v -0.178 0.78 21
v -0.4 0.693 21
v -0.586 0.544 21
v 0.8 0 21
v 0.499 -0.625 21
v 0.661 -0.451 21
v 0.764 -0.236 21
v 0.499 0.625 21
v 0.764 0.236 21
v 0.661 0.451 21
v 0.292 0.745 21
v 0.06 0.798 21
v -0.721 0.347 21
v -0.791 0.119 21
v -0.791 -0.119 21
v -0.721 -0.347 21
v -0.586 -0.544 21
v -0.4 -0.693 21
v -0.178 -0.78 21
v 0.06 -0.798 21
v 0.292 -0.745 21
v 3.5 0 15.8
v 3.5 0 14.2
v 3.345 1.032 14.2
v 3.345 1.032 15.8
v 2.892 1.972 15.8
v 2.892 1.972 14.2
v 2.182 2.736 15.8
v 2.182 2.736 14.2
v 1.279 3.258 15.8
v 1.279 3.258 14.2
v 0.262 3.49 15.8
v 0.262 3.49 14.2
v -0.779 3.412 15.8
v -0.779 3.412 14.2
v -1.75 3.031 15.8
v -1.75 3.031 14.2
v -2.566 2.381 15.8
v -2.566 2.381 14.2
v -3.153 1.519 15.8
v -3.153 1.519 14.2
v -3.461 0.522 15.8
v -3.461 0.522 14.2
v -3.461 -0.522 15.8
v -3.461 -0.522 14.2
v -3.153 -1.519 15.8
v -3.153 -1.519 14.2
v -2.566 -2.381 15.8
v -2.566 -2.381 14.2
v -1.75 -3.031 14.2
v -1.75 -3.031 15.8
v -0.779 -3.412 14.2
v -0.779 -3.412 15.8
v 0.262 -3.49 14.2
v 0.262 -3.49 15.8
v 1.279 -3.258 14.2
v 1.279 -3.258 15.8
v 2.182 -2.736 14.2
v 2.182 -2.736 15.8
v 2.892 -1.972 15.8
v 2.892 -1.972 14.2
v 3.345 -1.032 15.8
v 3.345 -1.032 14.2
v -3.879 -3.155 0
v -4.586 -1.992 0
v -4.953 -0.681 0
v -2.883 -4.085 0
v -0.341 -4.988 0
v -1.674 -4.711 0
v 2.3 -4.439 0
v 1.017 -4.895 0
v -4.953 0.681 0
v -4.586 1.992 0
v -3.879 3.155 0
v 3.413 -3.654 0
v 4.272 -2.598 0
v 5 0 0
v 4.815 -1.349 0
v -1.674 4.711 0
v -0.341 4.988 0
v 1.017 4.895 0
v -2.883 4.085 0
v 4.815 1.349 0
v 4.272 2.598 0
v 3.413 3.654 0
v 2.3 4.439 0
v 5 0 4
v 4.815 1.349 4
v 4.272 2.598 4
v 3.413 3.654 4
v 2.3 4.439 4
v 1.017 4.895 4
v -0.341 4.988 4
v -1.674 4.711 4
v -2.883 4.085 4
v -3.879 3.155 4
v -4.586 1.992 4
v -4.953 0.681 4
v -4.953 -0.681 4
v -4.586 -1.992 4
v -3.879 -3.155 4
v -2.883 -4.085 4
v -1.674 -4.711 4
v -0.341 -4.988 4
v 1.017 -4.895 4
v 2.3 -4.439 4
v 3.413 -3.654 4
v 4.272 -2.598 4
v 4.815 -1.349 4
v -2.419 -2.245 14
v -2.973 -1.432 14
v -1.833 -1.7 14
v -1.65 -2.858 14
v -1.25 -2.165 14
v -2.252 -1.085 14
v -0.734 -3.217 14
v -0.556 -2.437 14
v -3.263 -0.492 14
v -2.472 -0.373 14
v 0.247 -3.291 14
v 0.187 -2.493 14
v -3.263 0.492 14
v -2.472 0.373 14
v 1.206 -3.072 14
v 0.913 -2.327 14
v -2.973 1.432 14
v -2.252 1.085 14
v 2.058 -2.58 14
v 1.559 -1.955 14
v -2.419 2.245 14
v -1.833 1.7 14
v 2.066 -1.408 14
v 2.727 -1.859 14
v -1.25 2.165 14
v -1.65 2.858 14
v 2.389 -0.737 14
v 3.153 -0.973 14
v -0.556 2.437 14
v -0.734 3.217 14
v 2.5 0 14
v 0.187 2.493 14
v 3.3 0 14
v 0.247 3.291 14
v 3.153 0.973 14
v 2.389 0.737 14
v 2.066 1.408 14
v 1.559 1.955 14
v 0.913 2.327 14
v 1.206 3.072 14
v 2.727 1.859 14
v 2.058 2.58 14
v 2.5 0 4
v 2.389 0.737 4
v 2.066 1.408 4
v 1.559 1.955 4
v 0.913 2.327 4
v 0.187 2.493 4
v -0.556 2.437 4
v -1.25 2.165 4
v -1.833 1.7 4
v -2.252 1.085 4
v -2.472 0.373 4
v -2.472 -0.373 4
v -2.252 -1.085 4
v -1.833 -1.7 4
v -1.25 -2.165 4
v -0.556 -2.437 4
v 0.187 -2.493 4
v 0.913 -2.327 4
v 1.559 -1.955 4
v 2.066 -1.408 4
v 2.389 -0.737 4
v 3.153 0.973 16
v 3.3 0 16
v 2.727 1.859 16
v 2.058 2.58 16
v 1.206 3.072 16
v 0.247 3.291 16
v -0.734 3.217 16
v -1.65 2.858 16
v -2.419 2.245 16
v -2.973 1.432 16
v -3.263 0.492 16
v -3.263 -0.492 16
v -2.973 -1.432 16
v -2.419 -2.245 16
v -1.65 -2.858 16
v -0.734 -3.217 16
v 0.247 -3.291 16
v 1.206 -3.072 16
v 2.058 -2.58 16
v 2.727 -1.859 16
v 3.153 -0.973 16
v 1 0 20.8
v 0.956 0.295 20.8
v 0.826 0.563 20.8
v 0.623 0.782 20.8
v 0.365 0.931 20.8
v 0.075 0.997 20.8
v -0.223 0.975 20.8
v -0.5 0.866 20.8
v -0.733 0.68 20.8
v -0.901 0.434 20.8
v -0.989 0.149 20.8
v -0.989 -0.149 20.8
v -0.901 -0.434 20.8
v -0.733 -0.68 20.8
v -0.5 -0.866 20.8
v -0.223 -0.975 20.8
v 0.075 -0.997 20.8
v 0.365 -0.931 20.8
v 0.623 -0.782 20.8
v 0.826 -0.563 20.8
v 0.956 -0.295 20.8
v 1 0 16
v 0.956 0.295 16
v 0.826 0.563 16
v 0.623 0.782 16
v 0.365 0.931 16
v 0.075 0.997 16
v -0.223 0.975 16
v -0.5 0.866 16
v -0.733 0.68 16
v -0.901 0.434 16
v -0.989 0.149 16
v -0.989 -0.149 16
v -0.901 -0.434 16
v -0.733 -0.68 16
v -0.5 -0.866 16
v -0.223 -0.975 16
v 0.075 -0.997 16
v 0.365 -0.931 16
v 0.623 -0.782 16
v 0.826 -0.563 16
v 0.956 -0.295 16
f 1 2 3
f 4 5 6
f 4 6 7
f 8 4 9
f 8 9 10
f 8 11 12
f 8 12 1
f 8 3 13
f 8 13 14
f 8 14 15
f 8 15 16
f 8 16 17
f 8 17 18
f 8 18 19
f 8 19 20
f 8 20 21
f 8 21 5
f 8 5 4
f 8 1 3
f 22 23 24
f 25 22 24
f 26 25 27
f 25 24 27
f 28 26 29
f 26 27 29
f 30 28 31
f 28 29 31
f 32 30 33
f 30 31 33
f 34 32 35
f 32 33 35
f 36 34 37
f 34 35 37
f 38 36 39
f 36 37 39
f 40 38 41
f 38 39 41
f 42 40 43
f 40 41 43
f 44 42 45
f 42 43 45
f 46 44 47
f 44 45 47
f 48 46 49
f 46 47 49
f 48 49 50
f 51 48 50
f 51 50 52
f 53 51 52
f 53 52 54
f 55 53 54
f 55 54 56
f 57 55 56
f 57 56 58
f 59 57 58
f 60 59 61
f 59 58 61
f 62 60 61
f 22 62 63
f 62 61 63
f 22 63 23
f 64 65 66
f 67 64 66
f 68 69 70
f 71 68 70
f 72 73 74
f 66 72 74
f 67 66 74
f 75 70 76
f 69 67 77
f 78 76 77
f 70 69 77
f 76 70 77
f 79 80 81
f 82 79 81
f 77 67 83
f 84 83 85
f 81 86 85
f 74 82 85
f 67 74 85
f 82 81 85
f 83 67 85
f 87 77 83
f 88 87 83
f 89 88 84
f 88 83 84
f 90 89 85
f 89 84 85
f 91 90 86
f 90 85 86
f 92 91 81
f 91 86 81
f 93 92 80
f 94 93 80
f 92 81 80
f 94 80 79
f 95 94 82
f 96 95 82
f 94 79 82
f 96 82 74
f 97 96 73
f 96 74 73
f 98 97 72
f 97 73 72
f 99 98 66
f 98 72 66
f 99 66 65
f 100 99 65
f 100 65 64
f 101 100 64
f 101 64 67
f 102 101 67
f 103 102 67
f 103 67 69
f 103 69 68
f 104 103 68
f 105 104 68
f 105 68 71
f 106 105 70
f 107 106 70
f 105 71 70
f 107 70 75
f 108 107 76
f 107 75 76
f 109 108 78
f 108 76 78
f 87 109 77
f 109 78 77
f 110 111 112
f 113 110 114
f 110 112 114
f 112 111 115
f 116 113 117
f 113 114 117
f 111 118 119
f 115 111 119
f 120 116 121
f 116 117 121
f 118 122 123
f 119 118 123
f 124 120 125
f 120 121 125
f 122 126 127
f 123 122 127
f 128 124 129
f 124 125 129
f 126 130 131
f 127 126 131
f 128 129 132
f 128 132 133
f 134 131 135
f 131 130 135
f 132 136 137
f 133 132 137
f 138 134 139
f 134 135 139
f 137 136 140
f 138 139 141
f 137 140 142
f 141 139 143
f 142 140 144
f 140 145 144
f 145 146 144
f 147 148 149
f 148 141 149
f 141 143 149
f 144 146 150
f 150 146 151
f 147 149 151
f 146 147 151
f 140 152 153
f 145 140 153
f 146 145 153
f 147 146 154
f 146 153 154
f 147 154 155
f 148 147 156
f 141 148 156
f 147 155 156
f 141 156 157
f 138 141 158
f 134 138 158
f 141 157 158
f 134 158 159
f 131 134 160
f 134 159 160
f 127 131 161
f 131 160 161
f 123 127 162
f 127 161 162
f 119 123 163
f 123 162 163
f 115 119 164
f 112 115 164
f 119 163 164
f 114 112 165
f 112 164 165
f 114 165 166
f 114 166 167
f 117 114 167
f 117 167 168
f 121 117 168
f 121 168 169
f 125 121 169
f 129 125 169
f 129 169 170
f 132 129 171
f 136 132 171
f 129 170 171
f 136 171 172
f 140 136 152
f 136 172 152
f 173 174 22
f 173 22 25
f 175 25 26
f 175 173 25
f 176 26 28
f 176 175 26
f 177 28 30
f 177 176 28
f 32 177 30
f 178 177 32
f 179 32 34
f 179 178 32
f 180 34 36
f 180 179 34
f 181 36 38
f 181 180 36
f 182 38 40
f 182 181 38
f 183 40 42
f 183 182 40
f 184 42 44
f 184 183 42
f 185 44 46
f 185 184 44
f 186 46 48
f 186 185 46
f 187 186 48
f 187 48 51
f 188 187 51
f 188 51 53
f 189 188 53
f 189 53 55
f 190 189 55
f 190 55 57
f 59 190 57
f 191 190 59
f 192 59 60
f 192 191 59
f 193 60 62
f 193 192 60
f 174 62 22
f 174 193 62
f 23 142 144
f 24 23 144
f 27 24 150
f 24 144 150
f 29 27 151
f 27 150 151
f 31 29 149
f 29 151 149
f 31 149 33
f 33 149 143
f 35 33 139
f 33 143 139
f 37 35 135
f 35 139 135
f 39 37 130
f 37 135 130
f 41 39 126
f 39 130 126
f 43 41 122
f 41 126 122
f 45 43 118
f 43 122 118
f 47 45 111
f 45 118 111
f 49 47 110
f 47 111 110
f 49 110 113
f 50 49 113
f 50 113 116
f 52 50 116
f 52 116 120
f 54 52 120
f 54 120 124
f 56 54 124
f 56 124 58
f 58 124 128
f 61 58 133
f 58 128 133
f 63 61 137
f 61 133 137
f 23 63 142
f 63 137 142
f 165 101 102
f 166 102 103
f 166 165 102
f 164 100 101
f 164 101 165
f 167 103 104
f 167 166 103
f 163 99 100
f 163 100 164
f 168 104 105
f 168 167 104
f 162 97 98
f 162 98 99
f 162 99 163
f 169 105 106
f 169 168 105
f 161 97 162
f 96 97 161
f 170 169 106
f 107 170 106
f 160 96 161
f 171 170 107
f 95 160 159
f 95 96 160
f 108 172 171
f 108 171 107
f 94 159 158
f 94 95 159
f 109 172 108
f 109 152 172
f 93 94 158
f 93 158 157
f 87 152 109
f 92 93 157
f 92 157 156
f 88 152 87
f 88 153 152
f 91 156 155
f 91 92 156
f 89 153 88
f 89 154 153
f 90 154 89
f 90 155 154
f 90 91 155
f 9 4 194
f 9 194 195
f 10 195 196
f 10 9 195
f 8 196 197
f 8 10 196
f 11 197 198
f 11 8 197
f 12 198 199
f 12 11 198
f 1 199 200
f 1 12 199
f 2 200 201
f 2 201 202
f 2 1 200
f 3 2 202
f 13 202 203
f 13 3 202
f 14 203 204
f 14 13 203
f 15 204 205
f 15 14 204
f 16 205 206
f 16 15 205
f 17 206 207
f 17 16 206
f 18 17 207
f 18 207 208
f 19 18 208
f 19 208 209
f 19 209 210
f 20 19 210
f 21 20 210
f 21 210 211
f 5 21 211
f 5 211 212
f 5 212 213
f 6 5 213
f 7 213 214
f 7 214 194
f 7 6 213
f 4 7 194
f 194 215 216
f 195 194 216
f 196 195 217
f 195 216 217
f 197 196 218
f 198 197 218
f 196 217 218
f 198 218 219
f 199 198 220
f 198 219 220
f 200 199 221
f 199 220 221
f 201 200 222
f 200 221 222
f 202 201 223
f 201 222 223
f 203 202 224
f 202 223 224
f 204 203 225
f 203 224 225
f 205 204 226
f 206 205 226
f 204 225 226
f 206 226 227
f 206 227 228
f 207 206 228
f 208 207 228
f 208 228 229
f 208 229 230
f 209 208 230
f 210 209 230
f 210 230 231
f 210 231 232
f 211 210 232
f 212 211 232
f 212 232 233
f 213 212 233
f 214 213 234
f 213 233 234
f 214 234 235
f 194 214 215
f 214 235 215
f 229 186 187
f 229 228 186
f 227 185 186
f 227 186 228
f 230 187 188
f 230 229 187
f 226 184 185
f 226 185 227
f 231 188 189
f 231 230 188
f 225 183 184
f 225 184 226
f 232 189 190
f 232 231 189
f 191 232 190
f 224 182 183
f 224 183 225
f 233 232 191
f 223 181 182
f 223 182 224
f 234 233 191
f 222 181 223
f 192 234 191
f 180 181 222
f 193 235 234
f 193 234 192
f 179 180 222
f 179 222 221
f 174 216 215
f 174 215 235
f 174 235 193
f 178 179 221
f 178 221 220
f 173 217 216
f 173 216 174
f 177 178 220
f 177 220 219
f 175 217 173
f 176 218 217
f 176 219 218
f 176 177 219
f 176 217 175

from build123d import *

# Parameters (mm, degrees)
F0_R     = 5
F1_DEPTH = 4
F2_R     = 2.5
F3_DEPTH = 10
F4_R     = 3.5
F5_DEPTH = 2
F6_R     = 1
F7_DEPTH = 5
F8_SIZE  = 0.2


with BuildPart() as f1:
    # F0 (on Top) → F1 (new body)
    with BuildSketch(Plane.XY):
        Circle(F0_R)
    extrude(amount=F1_DEPTH)

    # F2 (on face) → F3 (join)
    with BuildSketch(Plane.XY.offset(4)):
        Circle(F2_R)
    extrude(amount=F3_DEPTH)

    # F4 (on face) → F5 (join)
    with BuildSketch(Plane.XY.offset(14)):
        Circle(F4_R)
    extrude(amount=F5_DEPTH)

    # F6 (on face) → F7 (join)
    with BuildSketch(Plane.XY.offset(16)):
        Circle(F6_R)
    extrude(amount=F7_DEPTH)

    # F8
    f8_edges = [f1.edges().sort_by_distance(p)[0] for p in [
        (-1, 0, 21),
        (-3.5, 0, 16),
        (-3.5, 0, 14),
    ]]
    chamfer(f8_edges, length=F8_SIZE)


solid = f1.part
